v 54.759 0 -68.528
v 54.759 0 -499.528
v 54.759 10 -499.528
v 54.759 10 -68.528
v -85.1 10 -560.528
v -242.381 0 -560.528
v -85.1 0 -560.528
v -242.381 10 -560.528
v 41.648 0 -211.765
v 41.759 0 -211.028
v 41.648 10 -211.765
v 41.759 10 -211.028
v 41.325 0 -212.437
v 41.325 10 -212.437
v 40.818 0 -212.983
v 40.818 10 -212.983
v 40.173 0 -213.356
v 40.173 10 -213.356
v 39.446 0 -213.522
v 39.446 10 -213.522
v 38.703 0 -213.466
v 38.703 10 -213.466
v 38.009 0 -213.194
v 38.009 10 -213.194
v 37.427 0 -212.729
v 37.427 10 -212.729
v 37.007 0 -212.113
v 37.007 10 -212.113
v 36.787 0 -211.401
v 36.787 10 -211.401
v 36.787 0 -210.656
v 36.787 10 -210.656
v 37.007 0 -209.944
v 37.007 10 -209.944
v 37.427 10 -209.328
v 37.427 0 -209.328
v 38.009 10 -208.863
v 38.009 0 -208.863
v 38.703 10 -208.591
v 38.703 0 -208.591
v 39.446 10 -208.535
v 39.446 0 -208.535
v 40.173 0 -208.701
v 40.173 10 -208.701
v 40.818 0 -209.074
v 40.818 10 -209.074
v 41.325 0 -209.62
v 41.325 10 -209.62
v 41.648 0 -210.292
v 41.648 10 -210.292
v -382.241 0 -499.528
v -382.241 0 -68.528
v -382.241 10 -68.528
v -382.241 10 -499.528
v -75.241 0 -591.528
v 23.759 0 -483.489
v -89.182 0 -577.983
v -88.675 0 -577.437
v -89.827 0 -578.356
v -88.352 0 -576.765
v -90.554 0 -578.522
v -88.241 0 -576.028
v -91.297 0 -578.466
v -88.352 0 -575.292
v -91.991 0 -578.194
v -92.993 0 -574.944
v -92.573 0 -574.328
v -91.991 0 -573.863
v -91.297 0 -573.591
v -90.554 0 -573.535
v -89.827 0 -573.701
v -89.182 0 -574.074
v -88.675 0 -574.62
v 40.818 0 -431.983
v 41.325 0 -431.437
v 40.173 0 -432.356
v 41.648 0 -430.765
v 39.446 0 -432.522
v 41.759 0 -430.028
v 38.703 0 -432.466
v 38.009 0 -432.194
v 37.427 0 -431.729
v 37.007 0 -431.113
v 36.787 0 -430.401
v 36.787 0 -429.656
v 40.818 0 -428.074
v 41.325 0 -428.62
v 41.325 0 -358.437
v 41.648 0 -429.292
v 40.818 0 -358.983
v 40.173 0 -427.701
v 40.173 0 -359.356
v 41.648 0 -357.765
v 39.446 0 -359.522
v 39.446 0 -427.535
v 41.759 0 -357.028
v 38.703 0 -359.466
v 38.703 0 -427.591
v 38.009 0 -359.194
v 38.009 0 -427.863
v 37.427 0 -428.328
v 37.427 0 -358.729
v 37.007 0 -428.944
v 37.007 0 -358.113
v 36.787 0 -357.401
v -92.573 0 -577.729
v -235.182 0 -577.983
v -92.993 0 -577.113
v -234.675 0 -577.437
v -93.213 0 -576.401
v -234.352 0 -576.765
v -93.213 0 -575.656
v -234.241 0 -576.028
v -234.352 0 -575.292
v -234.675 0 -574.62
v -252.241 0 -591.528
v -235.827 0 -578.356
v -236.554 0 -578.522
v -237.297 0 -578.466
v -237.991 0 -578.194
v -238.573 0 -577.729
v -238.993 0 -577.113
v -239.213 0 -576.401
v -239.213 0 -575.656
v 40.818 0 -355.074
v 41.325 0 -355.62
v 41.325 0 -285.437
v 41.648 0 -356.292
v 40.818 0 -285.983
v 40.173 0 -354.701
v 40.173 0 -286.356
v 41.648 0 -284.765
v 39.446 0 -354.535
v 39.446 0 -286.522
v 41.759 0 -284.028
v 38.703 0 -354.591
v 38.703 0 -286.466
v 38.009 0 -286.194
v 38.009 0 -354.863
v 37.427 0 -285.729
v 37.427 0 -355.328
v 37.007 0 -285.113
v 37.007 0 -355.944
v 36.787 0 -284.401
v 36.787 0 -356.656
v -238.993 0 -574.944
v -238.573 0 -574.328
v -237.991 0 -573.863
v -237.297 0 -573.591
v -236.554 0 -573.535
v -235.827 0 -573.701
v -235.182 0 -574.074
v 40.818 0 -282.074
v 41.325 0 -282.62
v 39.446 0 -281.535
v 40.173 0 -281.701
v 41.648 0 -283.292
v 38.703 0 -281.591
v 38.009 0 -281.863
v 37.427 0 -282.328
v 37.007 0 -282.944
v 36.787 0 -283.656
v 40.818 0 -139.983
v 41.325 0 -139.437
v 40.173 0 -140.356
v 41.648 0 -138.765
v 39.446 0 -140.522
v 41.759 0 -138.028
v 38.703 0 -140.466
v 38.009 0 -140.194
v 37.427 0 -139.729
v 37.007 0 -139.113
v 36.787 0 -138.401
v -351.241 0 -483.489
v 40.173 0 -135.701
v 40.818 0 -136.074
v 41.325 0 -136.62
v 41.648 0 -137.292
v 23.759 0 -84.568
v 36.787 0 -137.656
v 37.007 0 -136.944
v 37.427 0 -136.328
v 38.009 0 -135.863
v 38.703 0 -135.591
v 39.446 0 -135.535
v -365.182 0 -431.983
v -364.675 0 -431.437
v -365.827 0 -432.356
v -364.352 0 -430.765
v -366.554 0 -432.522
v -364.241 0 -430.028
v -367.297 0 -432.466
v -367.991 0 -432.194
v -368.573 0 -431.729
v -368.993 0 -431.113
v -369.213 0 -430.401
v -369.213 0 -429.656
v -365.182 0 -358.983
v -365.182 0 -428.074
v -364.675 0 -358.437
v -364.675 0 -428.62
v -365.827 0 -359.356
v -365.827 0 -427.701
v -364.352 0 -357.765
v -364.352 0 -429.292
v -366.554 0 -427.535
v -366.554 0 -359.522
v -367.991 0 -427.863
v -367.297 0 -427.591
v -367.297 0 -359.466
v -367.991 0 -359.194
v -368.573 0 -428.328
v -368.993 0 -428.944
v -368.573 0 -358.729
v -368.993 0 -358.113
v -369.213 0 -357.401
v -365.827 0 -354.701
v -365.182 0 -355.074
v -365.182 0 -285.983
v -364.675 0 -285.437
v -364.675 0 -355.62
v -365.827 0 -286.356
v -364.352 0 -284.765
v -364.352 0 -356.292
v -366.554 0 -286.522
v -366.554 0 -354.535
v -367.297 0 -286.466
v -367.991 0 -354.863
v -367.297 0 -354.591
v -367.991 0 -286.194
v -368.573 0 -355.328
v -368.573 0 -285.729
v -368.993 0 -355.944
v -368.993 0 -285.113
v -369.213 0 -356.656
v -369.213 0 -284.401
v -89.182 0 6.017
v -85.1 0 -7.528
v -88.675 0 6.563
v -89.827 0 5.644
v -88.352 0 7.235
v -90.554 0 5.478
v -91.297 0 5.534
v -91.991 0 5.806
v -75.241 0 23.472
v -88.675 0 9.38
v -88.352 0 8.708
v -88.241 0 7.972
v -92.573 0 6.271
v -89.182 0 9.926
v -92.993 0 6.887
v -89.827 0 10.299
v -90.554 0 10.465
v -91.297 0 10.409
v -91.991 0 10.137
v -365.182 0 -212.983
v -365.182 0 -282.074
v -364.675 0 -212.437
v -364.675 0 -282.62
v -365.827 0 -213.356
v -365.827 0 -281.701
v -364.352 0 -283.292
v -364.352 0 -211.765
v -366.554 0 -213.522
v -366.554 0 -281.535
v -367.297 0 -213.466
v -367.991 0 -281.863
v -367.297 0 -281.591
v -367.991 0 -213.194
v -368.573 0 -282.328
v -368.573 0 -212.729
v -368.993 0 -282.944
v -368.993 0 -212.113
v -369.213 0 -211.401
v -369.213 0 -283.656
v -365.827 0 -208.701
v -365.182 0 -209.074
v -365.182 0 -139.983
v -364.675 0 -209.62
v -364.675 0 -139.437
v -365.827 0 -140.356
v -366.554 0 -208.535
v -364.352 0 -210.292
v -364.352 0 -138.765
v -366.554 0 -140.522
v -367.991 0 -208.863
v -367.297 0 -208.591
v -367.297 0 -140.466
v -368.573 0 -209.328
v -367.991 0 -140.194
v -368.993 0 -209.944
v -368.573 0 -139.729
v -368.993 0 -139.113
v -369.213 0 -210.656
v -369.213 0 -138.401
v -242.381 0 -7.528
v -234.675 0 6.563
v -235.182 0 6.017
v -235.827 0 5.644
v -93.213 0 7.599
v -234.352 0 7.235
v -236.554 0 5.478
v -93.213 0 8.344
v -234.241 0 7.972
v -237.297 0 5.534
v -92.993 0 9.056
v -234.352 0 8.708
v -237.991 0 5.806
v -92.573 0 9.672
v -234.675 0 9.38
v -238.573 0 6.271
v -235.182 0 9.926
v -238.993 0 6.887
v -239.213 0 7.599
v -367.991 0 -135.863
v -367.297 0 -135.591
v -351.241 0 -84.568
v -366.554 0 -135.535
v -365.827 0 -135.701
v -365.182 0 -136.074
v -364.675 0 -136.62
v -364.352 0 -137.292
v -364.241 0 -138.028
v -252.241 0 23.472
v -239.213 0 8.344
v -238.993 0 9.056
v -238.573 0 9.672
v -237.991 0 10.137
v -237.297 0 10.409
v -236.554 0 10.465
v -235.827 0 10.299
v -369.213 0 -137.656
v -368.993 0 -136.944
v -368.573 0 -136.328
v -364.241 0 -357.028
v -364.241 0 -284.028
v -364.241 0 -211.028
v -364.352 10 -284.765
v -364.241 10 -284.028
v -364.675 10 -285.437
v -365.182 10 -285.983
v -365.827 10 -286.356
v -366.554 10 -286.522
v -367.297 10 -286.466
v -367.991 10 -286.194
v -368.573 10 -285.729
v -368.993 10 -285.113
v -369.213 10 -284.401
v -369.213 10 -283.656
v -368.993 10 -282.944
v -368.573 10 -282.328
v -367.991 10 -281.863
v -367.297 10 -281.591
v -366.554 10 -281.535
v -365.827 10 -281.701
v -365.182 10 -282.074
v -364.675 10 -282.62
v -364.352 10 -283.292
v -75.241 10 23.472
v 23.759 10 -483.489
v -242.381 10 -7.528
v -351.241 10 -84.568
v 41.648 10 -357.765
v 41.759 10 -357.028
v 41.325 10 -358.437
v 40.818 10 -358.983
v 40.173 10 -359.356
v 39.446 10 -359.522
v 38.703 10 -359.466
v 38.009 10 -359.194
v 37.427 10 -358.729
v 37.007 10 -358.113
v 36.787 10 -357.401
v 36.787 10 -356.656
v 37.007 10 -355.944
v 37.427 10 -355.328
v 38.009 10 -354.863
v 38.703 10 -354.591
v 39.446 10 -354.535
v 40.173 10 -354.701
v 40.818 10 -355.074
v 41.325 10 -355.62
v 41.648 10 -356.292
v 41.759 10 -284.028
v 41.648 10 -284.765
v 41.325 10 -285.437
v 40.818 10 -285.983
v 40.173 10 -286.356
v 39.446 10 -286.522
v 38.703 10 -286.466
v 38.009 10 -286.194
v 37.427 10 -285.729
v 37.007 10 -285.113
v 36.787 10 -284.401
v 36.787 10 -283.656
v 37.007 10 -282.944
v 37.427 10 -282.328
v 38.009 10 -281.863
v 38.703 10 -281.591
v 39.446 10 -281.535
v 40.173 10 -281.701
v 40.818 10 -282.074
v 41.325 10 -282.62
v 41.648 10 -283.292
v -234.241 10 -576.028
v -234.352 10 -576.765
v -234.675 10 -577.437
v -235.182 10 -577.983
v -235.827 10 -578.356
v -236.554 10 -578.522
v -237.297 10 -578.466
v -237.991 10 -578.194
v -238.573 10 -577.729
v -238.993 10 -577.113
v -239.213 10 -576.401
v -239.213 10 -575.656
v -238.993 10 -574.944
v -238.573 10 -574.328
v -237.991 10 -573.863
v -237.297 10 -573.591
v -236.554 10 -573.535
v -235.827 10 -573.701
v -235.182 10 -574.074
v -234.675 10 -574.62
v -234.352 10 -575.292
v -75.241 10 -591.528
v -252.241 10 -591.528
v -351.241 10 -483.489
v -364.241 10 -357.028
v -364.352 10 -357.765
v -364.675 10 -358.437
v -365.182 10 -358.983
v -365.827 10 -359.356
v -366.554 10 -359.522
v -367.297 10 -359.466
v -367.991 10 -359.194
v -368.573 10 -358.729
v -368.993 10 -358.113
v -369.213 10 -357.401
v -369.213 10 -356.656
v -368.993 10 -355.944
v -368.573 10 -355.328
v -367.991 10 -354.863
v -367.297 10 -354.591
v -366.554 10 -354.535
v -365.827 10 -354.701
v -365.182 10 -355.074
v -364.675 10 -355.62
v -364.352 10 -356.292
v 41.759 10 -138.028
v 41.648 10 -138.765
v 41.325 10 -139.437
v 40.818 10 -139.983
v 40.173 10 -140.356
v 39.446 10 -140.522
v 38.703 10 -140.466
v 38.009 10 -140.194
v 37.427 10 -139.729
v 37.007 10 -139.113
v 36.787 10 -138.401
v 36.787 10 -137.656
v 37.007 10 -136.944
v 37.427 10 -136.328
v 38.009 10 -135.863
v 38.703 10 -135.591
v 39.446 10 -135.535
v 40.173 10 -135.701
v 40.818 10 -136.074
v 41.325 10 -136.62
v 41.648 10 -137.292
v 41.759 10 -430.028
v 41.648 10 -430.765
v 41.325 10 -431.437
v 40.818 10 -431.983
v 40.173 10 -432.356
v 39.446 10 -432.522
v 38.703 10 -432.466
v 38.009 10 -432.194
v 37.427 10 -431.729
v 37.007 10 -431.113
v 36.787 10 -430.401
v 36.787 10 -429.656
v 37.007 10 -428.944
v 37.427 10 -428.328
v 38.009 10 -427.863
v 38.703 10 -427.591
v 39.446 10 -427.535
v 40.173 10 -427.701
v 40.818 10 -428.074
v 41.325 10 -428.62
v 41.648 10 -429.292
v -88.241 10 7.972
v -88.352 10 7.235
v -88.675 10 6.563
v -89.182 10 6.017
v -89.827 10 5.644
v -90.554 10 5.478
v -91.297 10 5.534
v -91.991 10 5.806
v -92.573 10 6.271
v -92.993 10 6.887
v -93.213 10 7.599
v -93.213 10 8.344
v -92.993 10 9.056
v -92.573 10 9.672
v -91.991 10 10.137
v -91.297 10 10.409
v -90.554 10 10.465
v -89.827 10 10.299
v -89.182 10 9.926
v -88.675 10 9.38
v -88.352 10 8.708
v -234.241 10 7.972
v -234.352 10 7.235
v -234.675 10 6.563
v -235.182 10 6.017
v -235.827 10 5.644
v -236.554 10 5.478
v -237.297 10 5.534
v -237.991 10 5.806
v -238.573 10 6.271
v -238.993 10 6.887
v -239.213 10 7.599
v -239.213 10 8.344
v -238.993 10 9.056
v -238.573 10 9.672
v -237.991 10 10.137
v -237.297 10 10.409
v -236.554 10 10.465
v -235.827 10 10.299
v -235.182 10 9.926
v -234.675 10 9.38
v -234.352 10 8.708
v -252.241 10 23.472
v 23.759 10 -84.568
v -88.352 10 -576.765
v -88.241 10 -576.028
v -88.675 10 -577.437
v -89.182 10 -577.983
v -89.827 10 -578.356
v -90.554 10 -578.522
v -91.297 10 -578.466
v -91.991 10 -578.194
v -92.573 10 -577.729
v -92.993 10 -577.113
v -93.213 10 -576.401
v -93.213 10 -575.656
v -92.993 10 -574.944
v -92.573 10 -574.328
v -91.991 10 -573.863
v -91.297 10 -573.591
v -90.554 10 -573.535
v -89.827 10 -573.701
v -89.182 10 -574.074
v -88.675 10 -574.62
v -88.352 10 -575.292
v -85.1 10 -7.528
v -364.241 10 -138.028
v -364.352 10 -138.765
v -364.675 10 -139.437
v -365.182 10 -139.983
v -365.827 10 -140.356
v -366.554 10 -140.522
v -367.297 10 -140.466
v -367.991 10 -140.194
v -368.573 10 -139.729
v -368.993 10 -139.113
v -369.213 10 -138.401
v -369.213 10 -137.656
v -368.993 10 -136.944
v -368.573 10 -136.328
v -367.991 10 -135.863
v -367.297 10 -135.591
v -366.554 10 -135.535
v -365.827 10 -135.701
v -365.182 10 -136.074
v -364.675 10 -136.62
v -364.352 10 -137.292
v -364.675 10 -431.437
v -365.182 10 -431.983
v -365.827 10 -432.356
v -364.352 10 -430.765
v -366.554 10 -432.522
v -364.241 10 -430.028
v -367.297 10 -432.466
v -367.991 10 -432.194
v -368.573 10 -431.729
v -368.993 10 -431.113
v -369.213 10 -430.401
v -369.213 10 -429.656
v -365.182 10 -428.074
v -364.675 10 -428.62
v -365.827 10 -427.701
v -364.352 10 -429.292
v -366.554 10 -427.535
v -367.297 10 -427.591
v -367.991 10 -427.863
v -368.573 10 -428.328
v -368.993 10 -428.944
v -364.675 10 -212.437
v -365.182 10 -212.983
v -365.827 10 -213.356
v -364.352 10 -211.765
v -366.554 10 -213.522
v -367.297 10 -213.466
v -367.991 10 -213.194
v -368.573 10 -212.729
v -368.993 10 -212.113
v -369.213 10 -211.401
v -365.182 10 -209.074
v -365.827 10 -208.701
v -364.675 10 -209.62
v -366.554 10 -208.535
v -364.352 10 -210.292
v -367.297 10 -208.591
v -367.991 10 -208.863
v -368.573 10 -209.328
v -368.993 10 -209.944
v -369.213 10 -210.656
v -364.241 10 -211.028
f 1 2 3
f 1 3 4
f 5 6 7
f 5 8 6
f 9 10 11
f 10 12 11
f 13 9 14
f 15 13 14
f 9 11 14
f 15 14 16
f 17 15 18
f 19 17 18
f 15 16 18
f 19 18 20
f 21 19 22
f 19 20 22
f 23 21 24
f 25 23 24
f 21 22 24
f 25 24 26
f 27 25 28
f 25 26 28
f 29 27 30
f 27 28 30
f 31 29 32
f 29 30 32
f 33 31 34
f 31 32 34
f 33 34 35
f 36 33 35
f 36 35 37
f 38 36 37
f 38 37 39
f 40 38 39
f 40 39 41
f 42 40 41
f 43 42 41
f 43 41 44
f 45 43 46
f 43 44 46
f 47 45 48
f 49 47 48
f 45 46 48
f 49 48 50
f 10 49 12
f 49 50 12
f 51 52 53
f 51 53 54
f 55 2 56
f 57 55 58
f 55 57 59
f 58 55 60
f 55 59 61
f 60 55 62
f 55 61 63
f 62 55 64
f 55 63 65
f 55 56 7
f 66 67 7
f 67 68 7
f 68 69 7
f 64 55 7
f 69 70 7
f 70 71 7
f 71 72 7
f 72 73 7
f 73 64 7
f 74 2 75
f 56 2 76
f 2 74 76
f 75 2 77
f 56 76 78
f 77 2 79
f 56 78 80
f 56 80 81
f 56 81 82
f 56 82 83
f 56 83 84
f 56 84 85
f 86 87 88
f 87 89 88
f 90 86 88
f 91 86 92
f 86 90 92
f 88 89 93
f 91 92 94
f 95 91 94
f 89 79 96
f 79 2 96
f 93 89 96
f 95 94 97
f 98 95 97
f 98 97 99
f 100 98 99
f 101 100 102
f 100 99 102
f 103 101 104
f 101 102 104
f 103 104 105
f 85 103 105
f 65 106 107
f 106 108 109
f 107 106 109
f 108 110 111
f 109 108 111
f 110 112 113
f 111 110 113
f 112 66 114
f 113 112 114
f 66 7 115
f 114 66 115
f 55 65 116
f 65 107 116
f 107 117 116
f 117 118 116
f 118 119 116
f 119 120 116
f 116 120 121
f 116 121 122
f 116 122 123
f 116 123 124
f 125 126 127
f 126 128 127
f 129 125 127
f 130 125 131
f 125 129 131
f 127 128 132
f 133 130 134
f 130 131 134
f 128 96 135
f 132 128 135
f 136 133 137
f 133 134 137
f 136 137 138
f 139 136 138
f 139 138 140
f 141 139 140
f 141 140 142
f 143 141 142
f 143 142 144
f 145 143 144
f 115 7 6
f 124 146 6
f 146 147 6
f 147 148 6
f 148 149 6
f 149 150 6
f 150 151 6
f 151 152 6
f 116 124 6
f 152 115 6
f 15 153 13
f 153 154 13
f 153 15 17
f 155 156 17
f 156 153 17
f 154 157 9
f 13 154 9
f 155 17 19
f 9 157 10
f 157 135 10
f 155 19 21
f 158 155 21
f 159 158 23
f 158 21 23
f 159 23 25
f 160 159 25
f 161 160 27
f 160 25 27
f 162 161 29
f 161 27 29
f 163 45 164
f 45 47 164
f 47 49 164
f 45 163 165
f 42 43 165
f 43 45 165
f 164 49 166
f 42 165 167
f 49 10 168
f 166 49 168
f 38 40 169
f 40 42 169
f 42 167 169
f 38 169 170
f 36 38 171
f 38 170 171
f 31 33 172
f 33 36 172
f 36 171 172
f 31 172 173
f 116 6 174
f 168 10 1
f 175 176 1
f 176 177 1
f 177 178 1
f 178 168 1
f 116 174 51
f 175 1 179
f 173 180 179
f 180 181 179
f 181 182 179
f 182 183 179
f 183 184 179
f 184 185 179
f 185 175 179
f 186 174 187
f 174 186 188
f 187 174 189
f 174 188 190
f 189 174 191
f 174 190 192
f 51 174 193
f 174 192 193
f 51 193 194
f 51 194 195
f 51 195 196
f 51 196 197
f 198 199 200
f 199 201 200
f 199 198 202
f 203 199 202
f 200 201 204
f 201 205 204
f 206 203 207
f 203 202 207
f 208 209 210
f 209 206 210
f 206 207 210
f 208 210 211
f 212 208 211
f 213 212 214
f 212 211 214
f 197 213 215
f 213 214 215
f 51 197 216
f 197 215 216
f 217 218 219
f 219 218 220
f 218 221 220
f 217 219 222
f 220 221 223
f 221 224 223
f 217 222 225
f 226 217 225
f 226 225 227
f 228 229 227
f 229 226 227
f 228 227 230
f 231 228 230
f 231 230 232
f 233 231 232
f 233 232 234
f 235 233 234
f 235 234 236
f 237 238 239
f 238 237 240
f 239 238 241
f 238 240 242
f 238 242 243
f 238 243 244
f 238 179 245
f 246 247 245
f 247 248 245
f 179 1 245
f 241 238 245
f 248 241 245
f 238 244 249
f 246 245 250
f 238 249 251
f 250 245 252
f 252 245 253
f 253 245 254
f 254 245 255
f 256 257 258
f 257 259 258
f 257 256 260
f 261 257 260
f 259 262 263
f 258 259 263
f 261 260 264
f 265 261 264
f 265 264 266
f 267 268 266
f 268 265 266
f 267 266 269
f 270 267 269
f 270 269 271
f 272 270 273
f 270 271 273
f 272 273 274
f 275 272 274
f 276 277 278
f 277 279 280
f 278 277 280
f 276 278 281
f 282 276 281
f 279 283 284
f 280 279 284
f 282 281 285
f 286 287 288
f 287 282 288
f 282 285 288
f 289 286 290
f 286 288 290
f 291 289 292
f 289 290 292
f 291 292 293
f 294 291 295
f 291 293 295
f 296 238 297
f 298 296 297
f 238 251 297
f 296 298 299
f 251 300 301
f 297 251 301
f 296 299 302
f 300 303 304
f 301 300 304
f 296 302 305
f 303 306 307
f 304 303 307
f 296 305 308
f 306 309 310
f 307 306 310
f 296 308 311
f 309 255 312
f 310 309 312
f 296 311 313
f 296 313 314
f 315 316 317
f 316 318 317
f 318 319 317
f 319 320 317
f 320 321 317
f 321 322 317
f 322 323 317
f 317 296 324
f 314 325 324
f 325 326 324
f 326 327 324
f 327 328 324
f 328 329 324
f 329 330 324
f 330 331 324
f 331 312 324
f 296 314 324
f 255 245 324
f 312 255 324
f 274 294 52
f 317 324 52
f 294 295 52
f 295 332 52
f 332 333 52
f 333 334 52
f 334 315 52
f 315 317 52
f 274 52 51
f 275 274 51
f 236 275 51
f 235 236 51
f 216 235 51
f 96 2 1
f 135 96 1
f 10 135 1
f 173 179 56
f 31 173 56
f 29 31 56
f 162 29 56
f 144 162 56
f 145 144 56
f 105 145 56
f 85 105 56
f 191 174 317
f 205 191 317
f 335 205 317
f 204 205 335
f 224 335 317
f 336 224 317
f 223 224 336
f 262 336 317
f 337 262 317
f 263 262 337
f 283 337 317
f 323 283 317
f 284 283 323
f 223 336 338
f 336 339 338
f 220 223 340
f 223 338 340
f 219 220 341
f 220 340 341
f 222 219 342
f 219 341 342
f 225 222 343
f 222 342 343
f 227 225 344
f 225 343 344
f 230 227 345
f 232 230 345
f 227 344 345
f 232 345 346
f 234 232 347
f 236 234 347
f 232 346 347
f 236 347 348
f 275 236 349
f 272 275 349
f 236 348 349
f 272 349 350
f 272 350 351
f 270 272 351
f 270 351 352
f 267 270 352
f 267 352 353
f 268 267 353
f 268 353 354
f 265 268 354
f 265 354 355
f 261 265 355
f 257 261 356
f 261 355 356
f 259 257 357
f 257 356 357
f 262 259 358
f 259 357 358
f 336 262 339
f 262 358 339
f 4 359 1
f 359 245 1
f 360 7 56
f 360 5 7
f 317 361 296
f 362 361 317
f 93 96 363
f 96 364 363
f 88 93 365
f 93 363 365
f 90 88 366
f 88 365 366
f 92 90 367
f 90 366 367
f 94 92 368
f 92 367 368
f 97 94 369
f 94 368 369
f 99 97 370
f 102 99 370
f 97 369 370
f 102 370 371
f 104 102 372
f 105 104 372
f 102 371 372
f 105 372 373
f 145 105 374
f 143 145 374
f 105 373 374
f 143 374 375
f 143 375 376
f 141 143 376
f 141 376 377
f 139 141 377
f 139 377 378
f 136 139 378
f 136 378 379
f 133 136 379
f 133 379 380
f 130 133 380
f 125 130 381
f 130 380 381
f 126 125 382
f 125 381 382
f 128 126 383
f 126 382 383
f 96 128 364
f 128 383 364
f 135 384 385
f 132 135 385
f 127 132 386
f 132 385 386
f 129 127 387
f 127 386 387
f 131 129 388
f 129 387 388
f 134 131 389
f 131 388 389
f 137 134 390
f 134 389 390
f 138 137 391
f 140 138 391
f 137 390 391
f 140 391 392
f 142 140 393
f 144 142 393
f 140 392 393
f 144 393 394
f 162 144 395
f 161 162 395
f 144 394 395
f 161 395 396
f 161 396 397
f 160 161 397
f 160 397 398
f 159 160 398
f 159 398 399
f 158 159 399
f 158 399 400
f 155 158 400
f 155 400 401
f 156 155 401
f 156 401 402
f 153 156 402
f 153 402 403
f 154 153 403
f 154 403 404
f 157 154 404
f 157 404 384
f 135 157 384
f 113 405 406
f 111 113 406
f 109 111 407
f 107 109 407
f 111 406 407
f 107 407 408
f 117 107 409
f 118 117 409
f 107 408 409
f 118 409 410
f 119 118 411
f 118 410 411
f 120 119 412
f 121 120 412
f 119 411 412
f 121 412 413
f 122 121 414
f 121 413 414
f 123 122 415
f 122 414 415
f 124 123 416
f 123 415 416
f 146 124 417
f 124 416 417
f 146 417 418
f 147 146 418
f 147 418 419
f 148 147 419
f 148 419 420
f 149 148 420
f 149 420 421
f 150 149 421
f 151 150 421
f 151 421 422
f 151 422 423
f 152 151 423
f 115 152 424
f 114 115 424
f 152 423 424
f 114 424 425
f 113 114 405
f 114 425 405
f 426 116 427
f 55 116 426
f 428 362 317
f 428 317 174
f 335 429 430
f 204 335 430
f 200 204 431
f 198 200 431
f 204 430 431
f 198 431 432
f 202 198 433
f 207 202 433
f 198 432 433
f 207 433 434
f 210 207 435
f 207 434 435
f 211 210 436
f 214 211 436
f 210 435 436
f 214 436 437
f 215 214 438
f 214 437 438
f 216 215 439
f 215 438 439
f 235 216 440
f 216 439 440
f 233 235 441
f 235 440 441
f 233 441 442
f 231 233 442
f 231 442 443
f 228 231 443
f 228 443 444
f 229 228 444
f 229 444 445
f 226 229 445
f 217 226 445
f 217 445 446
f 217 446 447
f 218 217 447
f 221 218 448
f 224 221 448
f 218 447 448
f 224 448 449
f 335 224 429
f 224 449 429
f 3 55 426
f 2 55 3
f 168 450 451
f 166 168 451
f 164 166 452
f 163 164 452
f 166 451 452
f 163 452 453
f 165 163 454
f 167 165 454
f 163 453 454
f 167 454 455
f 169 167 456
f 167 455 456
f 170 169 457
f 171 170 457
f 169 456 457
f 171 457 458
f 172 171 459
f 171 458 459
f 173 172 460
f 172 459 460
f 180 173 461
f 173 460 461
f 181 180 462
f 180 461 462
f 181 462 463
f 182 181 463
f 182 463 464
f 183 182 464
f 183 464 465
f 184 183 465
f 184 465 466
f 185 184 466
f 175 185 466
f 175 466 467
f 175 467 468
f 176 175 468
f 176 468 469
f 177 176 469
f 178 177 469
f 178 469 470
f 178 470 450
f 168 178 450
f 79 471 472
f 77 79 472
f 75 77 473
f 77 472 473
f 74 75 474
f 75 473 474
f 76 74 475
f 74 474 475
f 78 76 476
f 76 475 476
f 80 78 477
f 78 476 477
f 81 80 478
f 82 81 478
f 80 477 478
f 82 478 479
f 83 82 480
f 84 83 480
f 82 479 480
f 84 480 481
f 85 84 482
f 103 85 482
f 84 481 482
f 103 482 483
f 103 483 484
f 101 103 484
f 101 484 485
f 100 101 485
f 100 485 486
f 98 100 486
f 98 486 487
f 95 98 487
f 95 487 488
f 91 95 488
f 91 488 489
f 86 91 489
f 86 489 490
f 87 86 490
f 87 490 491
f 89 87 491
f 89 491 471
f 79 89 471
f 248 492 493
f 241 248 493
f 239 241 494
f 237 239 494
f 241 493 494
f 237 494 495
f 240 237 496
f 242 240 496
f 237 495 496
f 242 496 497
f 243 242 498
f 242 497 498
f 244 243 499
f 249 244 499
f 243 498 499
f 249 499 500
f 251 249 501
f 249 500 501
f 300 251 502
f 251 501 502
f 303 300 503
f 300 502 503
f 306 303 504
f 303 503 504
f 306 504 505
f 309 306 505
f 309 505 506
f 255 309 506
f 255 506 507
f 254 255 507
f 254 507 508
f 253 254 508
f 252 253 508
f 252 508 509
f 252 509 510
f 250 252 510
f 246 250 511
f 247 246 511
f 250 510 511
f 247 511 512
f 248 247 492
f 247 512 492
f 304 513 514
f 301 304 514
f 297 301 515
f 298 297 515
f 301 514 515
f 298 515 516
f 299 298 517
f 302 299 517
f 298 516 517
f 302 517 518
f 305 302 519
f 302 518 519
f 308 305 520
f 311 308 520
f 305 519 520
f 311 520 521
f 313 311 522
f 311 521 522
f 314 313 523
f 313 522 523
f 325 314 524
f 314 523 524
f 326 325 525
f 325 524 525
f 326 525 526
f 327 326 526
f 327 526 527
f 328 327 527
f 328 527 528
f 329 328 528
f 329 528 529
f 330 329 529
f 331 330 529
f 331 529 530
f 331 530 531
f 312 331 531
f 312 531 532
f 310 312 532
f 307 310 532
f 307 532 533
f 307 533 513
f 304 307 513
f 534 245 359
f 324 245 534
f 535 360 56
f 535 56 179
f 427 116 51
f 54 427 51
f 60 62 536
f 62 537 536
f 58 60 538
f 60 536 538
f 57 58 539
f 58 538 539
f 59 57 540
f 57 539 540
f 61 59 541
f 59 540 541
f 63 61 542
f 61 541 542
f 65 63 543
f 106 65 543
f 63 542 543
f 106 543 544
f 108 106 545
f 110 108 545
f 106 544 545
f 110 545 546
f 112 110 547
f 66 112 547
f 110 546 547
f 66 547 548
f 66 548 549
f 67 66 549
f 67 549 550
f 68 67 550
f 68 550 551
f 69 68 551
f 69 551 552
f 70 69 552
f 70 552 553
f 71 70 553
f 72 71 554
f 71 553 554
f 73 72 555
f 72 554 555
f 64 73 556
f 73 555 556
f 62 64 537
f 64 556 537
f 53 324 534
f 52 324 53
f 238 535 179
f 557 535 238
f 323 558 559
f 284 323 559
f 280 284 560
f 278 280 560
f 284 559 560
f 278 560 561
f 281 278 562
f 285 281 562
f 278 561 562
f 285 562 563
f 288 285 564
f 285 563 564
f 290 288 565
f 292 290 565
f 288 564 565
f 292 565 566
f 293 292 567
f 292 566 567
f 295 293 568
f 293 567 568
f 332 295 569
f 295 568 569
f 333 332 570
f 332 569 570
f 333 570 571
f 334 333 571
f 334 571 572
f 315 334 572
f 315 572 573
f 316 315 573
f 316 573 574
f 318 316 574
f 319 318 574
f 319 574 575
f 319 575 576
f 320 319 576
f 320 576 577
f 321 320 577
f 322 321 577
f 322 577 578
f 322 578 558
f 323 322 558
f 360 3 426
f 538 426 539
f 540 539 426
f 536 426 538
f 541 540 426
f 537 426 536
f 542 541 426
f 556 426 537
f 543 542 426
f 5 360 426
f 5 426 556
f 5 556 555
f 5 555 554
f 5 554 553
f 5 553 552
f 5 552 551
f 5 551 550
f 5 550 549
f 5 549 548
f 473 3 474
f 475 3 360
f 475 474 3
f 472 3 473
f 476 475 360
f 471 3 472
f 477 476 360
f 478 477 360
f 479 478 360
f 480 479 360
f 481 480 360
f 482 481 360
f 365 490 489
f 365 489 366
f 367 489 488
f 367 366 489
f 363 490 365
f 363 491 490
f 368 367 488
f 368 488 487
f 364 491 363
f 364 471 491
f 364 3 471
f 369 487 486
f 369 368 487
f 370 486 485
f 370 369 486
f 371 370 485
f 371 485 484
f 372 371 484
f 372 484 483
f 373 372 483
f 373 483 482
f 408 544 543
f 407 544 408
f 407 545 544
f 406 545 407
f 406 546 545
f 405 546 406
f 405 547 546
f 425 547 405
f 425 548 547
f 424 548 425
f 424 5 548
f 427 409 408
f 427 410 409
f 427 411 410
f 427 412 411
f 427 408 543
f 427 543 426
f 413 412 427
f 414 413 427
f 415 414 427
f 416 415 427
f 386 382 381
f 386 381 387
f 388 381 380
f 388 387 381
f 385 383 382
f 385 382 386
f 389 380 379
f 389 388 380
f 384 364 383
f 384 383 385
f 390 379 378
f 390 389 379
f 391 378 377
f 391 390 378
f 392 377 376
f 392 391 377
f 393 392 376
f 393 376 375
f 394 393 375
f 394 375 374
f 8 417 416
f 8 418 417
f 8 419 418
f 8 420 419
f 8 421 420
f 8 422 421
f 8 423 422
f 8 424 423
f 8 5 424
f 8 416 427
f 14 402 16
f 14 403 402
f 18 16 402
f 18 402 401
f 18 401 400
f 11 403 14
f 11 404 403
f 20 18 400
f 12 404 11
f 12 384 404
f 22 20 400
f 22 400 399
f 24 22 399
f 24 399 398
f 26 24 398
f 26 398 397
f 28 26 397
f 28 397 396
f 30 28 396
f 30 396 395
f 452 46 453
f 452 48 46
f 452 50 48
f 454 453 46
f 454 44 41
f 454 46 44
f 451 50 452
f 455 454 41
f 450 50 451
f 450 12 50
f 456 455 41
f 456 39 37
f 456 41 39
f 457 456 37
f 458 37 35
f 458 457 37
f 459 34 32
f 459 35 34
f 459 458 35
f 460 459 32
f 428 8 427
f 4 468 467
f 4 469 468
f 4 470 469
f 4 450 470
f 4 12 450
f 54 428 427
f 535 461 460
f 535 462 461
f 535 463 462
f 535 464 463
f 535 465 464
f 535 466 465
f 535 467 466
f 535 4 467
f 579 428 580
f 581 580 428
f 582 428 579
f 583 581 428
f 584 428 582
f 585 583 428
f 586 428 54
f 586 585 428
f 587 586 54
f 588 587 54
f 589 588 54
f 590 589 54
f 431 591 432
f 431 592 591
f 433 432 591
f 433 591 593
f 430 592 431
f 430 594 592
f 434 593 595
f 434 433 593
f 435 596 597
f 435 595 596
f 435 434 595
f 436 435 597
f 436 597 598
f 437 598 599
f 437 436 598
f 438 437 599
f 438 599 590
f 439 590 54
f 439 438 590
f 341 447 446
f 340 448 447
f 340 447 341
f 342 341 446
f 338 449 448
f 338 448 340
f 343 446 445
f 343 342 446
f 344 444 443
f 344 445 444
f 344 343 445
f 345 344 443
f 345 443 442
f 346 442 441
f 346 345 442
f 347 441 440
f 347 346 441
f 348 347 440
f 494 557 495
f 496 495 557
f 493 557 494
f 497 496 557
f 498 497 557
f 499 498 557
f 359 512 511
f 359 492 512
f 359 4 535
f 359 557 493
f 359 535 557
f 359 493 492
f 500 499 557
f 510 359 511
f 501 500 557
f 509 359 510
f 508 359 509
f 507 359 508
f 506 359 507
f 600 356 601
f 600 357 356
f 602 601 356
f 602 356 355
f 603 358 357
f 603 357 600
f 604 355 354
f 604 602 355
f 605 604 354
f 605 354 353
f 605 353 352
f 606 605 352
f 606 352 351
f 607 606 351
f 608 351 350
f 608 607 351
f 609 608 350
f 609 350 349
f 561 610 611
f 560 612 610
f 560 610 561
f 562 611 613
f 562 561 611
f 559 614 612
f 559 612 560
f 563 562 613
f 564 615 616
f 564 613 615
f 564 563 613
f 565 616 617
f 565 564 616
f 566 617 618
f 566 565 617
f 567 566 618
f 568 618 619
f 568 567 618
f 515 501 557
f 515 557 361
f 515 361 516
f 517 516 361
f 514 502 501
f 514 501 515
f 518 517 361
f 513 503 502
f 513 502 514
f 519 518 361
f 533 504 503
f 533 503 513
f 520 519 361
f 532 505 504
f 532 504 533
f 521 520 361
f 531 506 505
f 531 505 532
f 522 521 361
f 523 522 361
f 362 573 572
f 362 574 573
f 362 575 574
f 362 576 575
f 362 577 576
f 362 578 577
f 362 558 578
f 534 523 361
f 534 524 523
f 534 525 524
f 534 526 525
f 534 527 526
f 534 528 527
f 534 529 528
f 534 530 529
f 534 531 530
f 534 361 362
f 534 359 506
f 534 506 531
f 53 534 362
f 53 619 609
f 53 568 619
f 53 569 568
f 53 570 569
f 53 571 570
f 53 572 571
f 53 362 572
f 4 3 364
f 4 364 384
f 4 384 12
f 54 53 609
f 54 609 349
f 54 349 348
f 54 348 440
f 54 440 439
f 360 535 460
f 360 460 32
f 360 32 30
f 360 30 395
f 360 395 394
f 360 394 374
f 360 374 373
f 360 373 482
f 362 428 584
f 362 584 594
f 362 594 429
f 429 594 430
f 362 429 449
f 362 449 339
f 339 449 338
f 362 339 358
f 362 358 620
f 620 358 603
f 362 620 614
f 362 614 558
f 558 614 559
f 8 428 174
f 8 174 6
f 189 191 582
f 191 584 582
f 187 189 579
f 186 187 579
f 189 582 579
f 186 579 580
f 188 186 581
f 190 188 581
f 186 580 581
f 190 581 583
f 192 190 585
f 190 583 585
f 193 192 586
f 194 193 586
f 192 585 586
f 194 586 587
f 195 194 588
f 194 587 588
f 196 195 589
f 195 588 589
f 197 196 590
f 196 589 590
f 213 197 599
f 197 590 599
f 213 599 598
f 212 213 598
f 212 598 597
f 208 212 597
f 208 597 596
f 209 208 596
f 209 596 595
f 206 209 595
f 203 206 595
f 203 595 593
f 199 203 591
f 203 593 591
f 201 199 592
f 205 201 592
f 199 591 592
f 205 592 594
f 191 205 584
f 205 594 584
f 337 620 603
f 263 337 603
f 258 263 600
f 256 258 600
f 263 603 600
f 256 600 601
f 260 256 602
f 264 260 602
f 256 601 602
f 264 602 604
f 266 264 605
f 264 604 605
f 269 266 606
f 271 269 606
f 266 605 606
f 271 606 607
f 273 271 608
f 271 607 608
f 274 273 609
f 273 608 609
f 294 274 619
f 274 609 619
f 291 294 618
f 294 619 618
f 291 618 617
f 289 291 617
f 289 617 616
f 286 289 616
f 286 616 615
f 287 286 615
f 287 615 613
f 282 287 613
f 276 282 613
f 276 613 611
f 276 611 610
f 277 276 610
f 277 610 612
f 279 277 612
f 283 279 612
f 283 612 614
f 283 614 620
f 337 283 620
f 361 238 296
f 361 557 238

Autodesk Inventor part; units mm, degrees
ref_plane "YZ Plane" through (0, 0, 0) normal (1, 0, 0) x (0, 1, 0)
ref_plane "XZ Plane" through (0, 0, 0) normal (0, 1, 0) x (-1, 0, 0)
ref_plane "XY Plane" through (0, 0, 0) normal (0, 0, 1) x (1, 0, 0)
sketch "Sketch1" plane through (0, 0, 0) normal (0, 1, 0) x (-1, 0, 0)
  line L0 (75.2406, 23.4715) -> (252.2406, 23.4715)
  line L1 (382.2406, -68.5285) -> (382.2406, -499.5285)
  line L2 (252.2406, -591.5285) -> (75.2406, -591.5285)
  line L3 (-54.7594, -499.5285) -> (-54.7594, -68.5285)
  line L4 (-54.7594, -284.0285) -> (382.2406, -284.0285)
  line L5 (382.2406, -284.0285) -> (382.2406, -499.5285)
  line L6 (163.7406, 23.4715) -> (163.7406, -591.5285)
  line L7 (163.7406, -591.5285) -> (252.2406, -591.5285)
  line L8 (252.2406, -591.5285) -> (382.2406, -499.5285)
  line L9 (75.2406, -591.5285) -> (-54.7594, -499.5285)
  line L10 (252.2406, 23.4715) -> (382.2406, -68.5285)
  line L11 (75.2406, 23.4715) -> (-54.7594, -68.5285)
  point P0 (0, 0)
  dimension "d0" = 437
  dimension "d2" = 215.5
  dimension "d3" = 88.5
  dimension "d4" = 615
extrude "Extrusion1" add sketch "Sketch1" along normal blind 10
sketch "Sketch2" plane through (0, 10, 0) normal (0, 1, 0) x (1, 0, 0)
  line L0 (-382.2406, 499.5285) -> (-382.2406, 68.5285) projected
  line L1 (-252.2406, -23.4715) -> (-75.2406, -23.4715) projected
  line L2 (-75.2406, -23.4715) -> (54.7594, 68.5285) projected
  line L3 (54.7594, 68.5285) -> (54.7594, 499.5285) projected
  line L4 (54.7594, 499.5285) -> (-75.2406, 591.5285) projected
  line L5 (-75.2406, 591.5285) -> (-252.2406, 591.5285) projected
  line L6 (-163.7406, 591.5285) -> (-163.7406, -23.4715)
  line L7 (-382.2406, 499.5285) -> (54.7594, 499.5285)
  line L8 (-163.7406, 499.5285) -> (-90.7406, 499.5285)
  line L9 (-90.7406, 499.5285) -> (39.2594, 499.5285)
  line L10 (39.2594, 499.5285) -> (39.2594, 510.4977)
  line L11 (-382.2406, 284.0285) -> (54.7594, 284.0285)
  circle A0 centre (39.2594, 284.0285) radius 2.5
  line L12 (39.2594, 284.0285) -> (39.2594, 357.0285)
  line L13 (39.2594, 359.5285) -> (39.2594, 430.0285)
  circle A1 centre (39.2594, 357.0285) radius 2.5
  circle A2 centre (39.2594, 211.0285) radius 2.5
  circle A3 centre (-366.7406, 357.0285) radius 2.5
  circle A4 centre (-366.7406, 211.0285) radius 2.5
  line L14 (39.2594, 393.5285) -> (-90.7406, 393.5285)
  line L15 (-90.7406, 393.5285) -> (-90.7406, 540.5285)
  circle A5 centre (39.2594, 430.0285) radius 2.5
  line L16 (-90.7406, 430.0285) -> (-90.7406, 576.0285)
  circle A6 centre (-90.7406, 576.0285) radius 2.5
  line L17 (-382.2406, 68.5285) -> (54.7594, 68.5285)
  circle A7 centre (39.2594, 138.0285) radius 2.5
  circle A8 centre (-90.7406, -7.9715) radius 2.5
  circle A9 centre (-366.7406, 430.0285) radius 2.5
  circle A10 centre (-236.7406, 576.0285) radius 2.5
  circle A11 centre (-236.7406, -7.9715) radius 2.5
  circle A12 centre (-366.7406, 138.0285) radius 2.5
  line L18 (-90.7406, 499.5285) -> (-90.7406, 68.5285)
  line L19 (-90.7406, -23.4715) -> (-90.7406, -34.4408)
  line L20 (-90.7406, 499.5285) -> (-90.7406, 573.5285)
  line L21 (-90.7406, 591.5285) -> (-90.7406, 602.4977)
  line L22 (39.2594, 499.5285) -> (39.2594, 281.5285)
  line L23 (39.2594, 68.5285) -> (39.2594, 57.5592)
  circle A13 centre (-366.7406, 284.0285) radius 2.5
  point P0 (0, 0)
  dimension "d9" = 5
  dimension "d12" = 5
  dimension "d22" = 5
  dimension "d7" = 73
  dimension "d8" = 130
  dimension "d10" = 73
  dimension "d11" = 73
  dimension "d19" = 5
  dimension "d20" = 615
  dimension "d21" = 146
  dimension "d23" = 437
  dimension "d25" = 5
extrude "Extrusion2" cut sketch "Sketch2" against normal blind 10 contours A6 | A13 L11 | L11 A13 | A0 L12 L11 | L11 L22 A0 | L22 L13 A5 | A5 L13 L22 | L12 A0 L11 | L11 A0 L22 | A1 L22 L12 | L12 L22 A1 | A2 | A3 | A4 | A7 | A8 | A9 | A10 | A11 | A12
sketch "Sketch3" plane through (0, 10, 0) normal (0, 1, 0) x (1, 0, 0)
  line L0 (-382.2406, 499.5285) -> (-382.2406, 68.5285) projected
  line L1 (-382.2406, 68.5285) -> (-252.2406, -23.4715) projected
  line L2 (-252.2406, -23.4715) -> (-75.2406, -23.4715) projected
  line L3 (-75.2406, -23.4715) -> (54.7594, 68.5285) projected
  line L4 (54.7594, 68.5285) -> (54.7594, 499.5285) projected
  line L5 (54.7594, 499.5285) -> (-75.2406, 591.5285) projected
  line L6 (-75.2406, 591.5285) -> (-252.2406, 591.5285) projected
  line L7 (-252.2406, 591.5285) -> (-382.2406, 499.5285) projected
  line L8 (-85.1002, 560.5285) -> (23.7594, 483.4894)
  line L9 (23.7594, 483.4894) -> (23.7594, 84.5676)
  line L10 (23.7594, 84.5676) -> (-85.1002, 7.5285)
  line L11 (-85.1002, 7.5285) -> (-242.381, 7.5285)
  line L12 (-242.381, 7.5285) -> (-351.2406, 84.5676)
  line L13 (-351.2406, 84.5676) -> (-351.2406, 483.4894)
  line L14 (-351.2406, 483.4894) -> (-242.381, 560.5285)
  line L15 (-242.381, 560.5285) -> (-85.1002, 560.5285)
  line L16 (-382.2406, 319.1066) -> (-351.2406, 319.1066)
  point P0 (0, 0)
  dimension "d26" = 31
extrude "Extrusion3" cut sketch "Sketch3" against normal blind 10 contours L13 L14 L15 L8 L9 L10 L11 L12
properties part number "mount_holes_plate"
